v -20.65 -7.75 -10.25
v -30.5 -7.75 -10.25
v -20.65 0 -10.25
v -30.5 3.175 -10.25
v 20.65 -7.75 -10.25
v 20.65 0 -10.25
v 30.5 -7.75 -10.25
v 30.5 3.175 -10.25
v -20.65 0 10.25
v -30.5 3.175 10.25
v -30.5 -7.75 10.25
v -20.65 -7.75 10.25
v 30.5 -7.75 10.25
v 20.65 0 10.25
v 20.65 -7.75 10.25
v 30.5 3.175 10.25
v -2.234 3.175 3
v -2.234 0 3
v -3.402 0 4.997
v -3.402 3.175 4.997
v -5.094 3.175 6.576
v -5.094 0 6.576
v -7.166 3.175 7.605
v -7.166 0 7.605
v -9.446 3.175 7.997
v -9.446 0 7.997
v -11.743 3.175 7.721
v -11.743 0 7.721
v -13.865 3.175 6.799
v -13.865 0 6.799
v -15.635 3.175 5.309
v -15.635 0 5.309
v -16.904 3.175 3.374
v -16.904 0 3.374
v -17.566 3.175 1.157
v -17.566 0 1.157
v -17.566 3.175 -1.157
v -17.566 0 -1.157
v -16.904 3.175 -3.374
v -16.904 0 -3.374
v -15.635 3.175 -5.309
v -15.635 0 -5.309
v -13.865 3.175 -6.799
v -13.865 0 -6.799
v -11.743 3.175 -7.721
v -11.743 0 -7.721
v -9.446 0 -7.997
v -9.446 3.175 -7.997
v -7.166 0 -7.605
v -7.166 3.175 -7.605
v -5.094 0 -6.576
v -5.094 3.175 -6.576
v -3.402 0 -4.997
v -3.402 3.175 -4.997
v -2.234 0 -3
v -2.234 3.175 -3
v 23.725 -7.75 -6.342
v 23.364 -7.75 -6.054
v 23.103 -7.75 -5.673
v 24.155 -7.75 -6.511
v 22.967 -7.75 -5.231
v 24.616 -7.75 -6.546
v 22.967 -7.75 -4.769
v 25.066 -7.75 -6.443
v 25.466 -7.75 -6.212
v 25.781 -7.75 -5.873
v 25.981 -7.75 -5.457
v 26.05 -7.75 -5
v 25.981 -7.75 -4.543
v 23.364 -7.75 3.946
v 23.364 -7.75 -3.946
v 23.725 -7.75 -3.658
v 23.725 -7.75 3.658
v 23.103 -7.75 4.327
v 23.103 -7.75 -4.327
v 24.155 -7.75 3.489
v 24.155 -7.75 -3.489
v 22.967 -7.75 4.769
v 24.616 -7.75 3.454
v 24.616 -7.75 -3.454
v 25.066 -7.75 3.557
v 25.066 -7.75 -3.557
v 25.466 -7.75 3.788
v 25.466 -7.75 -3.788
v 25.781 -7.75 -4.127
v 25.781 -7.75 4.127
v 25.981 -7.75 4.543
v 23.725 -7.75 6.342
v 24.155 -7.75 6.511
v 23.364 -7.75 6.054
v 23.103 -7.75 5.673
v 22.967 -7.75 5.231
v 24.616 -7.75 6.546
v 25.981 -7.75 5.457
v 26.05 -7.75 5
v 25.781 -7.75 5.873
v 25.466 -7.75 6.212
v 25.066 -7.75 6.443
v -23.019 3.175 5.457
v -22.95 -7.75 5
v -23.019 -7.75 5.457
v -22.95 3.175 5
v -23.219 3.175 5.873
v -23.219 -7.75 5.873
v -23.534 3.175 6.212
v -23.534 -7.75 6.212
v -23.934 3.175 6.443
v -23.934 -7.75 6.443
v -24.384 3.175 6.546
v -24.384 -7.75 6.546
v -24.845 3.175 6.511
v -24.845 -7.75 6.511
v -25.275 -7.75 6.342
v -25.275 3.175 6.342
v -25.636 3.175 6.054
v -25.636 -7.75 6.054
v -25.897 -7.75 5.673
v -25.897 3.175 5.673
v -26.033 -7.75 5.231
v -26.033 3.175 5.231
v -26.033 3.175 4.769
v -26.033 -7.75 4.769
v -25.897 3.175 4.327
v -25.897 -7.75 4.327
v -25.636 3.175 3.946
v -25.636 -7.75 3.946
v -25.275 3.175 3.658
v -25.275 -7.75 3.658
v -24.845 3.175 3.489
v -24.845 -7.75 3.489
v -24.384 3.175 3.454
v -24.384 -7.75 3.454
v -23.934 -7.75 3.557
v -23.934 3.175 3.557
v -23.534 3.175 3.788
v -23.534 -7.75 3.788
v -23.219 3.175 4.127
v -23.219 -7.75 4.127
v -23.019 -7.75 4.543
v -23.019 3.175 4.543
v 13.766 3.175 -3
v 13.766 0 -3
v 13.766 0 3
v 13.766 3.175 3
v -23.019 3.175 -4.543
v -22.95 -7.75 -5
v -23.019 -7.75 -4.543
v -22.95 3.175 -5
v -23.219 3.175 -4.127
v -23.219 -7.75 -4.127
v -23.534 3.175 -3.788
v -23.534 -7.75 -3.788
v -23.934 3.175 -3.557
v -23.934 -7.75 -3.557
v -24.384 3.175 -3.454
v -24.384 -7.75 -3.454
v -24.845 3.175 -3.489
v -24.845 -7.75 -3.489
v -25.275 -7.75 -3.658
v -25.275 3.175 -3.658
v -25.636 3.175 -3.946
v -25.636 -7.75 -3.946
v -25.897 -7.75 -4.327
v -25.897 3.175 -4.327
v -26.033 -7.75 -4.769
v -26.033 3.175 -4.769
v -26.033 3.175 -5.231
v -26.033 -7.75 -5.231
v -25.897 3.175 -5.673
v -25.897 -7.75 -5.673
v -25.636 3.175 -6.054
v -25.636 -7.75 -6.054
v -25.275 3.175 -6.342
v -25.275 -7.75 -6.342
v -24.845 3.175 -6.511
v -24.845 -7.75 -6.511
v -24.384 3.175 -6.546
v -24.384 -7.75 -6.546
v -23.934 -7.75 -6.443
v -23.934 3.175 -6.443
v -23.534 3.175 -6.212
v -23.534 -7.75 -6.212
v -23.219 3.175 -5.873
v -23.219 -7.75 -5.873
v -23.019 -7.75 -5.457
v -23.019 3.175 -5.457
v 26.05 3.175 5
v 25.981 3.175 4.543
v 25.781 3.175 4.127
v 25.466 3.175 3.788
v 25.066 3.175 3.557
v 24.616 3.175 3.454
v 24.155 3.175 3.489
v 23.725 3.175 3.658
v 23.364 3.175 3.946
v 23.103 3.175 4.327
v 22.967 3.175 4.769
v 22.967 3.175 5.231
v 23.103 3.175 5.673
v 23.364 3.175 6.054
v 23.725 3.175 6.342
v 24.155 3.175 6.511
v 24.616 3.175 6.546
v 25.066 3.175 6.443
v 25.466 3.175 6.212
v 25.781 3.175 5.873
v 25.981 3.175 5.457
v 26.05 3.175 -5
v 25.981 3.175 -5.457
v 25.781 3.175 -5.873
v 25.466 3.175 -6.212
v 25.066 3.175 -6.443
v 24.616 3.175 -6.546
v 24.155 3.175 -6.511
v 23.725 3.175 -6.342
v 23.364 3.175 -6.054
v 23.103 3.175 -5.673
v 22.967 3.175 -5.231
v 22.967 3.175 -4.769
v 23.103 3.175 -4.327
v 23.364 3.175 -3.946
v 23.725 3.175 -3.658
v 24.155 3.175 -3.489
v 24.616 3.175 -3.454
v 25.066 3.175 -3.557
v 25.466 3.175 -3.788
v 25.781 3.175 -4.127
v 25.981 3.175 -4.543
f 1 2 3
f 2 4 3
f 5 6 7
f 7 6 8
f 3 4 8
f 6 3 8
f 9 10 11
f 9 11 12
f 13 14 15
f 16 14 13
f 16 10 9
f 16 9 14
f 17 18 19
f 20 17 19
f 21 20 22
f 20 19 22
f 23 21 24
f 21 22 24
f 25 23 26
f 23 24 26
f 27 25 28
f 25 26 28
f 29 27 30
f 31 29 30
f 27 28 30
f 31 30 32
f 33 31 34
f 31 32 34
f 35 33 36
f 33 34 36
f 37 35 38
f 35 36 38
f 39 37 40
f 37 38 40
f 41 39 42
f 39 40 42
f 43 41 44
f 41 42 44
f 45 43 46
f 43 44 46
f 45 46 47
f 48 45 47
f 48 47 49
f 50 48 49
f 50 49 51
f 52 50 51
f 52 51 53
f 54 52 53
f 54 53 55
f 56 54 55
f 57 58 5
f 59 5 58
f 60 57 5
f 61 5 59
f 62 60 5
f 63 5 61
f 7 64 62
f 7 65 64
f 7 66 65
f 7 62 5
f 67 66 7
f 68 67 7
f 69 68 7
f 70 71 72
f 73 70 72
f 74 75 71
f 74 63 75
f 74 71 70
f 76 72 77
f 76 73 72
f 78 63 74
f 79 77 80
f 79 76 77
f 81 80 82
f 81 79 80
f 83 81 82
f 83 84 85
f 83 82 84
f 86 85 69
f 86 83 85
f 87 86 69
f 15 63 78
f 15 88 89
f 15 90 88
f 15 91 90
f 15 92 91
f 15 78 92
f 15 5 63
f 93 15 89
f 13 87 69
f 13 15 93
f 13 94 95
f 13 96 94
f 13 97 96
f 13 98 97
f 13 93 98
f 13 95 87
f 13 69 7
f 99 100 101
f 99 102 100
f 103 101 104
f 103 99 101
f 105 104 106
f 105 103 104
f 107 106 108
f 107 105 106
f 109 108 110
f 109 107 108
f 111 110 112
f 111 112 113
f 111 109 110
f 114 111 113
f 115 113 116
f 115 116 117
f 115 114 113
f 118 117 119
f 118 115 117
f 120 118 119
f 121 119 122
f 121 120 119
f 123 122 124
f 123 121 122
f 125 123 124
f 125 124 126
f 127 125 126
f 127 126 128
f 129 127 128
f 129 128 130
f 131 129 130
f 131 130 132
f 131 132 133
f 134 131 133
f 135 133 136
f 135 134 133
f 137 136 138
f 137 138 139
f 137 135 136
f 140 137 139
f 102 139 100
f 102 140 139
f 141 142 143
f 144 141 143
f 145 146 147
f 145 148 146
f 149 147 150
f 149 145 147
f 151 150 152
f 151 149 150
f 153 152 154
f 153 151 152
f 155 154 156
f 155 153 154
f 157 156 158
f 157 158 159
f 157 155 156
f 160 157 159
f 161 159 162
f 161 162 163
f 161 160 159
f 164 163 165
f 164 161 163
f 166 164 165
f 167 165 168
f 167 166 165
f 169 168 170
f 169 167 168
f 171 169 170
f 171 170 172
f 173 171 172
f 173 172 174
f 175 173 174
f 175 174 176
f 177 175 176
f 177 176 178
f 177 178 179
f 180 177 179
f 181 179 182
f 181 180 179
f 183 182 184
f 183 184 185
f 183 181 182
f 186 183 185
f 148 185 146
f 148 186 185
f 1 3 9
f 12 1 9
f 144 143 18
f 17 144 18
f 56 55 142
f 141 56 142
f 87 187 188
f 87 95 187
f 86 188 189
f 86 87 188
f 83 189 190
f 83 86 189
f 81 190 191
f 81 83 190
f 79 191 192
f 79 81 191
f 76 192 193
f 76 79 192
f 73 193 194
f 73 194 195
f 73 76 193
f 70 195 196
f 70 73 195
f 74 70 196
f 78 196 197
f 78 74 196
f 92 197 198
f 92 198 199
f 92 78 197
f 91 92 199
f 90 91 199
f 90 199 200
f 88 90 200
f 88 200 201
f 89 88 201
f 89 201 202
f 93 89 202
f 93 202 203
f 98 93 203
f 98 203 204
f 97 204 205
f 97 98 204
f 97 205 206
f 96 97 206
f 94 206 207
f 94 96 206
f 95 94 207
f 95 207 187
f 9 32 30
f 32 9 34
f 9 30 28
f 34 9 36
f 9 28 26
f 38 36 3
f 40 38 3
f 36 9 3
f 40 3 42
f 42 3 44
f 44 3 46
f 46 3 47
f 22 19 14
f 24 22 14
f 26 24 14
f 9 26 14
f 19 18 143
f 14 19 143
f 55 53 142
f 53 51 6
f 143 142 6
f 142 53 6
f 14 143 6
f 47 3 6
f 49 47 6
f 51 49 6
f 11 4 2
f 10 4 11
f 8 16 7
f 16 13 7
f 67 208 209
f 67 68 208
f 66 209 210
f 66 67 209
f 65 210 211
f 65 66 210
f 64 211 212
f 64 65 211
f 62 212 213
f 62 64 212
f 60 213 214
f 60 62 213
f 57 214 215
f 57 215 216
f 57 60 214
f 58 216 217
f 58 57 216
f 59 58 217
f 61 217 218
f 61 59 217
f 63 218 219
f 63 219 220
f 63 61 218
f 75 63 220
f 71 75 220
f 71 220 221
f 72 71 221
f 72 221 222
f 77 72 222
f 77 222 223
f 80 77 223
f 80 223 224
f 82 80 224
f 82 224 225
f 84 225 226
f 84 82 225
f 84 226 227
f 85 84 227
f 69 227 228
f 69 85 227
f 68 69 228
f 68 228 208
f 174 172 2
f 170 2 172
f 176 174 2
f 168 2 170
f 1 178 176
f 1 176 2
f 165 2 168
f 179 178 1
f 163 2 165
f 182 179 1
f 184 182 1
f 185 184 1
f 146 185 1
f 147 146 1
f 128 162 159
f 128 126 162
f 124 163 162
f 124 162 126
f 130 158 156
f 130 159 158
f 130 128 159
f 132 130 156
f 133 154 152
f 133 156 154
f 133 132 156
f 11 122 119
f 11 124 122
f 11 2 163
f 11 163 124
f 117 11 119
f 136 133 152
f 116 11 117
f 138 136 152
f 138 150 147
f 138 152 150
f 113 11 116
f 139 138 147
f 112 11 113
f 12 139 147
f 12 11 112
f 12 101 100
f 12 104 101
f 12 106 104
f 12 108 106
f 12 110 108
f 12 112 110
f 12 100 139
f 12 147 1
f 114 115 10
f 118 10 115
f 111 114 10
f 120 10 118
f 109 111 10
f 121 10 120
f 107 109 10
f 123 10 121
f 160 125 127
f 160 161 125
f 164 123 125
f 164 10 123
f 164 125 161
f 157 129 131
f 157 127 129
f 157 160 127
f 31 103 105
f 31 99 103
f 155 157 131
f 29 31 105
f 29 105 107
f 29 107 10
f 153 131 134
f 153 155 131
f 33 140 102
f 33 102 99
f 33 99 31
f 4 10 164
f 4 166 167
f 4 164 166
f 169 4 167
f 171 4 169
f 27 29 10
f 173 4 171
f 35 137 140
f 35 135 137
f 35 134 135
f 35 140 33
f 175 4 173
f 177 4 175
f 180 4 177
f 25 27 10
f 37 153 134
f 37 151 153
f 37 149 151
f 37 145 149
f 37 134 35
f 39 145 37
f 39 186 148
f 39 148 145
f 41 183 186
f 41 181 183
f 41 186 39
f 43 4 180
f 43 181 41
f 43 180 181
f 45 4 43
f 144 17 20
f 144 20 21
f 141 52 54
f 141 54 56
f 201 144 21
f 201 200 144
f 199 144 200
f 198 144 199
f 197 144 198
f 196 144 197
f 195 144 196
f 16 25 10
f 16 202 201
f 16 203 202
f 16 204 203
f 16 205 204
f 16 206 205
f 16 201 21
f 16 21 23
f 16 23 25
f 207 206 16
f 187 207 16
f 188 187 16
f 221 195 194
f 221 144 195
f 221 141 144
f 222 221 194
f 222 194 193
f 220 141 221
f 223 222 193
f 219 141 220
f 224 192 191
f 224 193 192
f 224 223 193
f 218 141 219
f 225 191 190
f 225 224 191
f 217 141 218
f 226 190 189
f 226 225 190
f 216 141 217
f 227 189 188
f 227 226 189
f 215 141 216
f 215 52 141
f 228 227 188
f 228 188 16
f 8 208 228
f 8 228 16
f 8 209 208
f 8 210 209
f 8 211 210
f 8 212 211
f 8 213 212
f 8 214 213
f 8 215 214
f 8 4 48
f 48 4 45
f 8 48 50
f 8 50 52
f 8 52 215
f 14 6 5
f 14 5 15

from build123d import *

# Parameters (mm, degrees)
SKETCH2_W           = 61
SKETCH2_H           = 20.5
SKETCH2_R           = 1.55
BOSS_EXTRUDE1_DEPTH = 3.175
SKETCH3_W           = 9.85
SKETCH3_H           = 20.5
SKETCH3_R           = 1.55
BOSS_EXTRUDE2_DEPTH = 7.75


with BuildPart() as part:
    # Sketch2 → Boss-Extrude1 (new body)
    with BuildSketch(Plane(origin=(0, 0, 0), x_dir=(1, 0, 0), z_dir=(0, 1, 0))):
        Rectangle(SKETCH2_W, SKETCH2_H)
        with Locations((-24.5, -5)):
            Circle(SKETCH2_R, mode=Mode.SUBTRACT)
        with BuildLine():
            ThreePointArc((-2.233801513, -3), (-17.65, 0), (-2.233801513, 3))
            Line((-2.233801513, 3), (13.766198487, 3))
            Line((13.766198487, 3), (13.766198487, -3))
            Line((13.766198487, -3), (-2.233801513, -3))
        make_face(mode=Mode.SUBTRACT)
        with Locations((24.5, -5)):
            Circle(SKETCH2_R, mode=Mode.SUBTRACT)
        with Locations((-24.5, 5)):
            Circle(SKETCH2_R, mode=Mode.SUBTRACT)
        with Locations((24.5, 5)):
            Circle(SKETCH2_R, mode=Mode.SUBTRACT)
    extrude(amount=BOSS_EXTRUDE1_DEPTH)

    # Sketch3 → Boss-Extrude2 (add)
    with BuildSketch(Plane.XZ):
        with Locations((-25.575, 0)):
            Rectangle(SKETCH3_W, SKETCH3_H)
        with Locations((-24.5, -5)):
            Circle(SKETCH3_R, mode=Mode.SUBTRACT)
        with Locations((-24.5, 5)):
            Circle(SKETCH3_R, mode=Mode.SUBTRACT)
        with Locations((25.575, 0)):
            Rectangle(SKETCH3_W, SKETCH3_H)
        with Locations((24.5, -5)):
            Circle(SKETCH3_R, mode=Mode.SUBTRACT)
        with Locations((24.5, 5)):
            Circle(SKETCH3_R, mode=Mode.SUBTRACT)
    extrude(amount=BOSS_EXTRUDE2_DEPTH)


solid = part.part
